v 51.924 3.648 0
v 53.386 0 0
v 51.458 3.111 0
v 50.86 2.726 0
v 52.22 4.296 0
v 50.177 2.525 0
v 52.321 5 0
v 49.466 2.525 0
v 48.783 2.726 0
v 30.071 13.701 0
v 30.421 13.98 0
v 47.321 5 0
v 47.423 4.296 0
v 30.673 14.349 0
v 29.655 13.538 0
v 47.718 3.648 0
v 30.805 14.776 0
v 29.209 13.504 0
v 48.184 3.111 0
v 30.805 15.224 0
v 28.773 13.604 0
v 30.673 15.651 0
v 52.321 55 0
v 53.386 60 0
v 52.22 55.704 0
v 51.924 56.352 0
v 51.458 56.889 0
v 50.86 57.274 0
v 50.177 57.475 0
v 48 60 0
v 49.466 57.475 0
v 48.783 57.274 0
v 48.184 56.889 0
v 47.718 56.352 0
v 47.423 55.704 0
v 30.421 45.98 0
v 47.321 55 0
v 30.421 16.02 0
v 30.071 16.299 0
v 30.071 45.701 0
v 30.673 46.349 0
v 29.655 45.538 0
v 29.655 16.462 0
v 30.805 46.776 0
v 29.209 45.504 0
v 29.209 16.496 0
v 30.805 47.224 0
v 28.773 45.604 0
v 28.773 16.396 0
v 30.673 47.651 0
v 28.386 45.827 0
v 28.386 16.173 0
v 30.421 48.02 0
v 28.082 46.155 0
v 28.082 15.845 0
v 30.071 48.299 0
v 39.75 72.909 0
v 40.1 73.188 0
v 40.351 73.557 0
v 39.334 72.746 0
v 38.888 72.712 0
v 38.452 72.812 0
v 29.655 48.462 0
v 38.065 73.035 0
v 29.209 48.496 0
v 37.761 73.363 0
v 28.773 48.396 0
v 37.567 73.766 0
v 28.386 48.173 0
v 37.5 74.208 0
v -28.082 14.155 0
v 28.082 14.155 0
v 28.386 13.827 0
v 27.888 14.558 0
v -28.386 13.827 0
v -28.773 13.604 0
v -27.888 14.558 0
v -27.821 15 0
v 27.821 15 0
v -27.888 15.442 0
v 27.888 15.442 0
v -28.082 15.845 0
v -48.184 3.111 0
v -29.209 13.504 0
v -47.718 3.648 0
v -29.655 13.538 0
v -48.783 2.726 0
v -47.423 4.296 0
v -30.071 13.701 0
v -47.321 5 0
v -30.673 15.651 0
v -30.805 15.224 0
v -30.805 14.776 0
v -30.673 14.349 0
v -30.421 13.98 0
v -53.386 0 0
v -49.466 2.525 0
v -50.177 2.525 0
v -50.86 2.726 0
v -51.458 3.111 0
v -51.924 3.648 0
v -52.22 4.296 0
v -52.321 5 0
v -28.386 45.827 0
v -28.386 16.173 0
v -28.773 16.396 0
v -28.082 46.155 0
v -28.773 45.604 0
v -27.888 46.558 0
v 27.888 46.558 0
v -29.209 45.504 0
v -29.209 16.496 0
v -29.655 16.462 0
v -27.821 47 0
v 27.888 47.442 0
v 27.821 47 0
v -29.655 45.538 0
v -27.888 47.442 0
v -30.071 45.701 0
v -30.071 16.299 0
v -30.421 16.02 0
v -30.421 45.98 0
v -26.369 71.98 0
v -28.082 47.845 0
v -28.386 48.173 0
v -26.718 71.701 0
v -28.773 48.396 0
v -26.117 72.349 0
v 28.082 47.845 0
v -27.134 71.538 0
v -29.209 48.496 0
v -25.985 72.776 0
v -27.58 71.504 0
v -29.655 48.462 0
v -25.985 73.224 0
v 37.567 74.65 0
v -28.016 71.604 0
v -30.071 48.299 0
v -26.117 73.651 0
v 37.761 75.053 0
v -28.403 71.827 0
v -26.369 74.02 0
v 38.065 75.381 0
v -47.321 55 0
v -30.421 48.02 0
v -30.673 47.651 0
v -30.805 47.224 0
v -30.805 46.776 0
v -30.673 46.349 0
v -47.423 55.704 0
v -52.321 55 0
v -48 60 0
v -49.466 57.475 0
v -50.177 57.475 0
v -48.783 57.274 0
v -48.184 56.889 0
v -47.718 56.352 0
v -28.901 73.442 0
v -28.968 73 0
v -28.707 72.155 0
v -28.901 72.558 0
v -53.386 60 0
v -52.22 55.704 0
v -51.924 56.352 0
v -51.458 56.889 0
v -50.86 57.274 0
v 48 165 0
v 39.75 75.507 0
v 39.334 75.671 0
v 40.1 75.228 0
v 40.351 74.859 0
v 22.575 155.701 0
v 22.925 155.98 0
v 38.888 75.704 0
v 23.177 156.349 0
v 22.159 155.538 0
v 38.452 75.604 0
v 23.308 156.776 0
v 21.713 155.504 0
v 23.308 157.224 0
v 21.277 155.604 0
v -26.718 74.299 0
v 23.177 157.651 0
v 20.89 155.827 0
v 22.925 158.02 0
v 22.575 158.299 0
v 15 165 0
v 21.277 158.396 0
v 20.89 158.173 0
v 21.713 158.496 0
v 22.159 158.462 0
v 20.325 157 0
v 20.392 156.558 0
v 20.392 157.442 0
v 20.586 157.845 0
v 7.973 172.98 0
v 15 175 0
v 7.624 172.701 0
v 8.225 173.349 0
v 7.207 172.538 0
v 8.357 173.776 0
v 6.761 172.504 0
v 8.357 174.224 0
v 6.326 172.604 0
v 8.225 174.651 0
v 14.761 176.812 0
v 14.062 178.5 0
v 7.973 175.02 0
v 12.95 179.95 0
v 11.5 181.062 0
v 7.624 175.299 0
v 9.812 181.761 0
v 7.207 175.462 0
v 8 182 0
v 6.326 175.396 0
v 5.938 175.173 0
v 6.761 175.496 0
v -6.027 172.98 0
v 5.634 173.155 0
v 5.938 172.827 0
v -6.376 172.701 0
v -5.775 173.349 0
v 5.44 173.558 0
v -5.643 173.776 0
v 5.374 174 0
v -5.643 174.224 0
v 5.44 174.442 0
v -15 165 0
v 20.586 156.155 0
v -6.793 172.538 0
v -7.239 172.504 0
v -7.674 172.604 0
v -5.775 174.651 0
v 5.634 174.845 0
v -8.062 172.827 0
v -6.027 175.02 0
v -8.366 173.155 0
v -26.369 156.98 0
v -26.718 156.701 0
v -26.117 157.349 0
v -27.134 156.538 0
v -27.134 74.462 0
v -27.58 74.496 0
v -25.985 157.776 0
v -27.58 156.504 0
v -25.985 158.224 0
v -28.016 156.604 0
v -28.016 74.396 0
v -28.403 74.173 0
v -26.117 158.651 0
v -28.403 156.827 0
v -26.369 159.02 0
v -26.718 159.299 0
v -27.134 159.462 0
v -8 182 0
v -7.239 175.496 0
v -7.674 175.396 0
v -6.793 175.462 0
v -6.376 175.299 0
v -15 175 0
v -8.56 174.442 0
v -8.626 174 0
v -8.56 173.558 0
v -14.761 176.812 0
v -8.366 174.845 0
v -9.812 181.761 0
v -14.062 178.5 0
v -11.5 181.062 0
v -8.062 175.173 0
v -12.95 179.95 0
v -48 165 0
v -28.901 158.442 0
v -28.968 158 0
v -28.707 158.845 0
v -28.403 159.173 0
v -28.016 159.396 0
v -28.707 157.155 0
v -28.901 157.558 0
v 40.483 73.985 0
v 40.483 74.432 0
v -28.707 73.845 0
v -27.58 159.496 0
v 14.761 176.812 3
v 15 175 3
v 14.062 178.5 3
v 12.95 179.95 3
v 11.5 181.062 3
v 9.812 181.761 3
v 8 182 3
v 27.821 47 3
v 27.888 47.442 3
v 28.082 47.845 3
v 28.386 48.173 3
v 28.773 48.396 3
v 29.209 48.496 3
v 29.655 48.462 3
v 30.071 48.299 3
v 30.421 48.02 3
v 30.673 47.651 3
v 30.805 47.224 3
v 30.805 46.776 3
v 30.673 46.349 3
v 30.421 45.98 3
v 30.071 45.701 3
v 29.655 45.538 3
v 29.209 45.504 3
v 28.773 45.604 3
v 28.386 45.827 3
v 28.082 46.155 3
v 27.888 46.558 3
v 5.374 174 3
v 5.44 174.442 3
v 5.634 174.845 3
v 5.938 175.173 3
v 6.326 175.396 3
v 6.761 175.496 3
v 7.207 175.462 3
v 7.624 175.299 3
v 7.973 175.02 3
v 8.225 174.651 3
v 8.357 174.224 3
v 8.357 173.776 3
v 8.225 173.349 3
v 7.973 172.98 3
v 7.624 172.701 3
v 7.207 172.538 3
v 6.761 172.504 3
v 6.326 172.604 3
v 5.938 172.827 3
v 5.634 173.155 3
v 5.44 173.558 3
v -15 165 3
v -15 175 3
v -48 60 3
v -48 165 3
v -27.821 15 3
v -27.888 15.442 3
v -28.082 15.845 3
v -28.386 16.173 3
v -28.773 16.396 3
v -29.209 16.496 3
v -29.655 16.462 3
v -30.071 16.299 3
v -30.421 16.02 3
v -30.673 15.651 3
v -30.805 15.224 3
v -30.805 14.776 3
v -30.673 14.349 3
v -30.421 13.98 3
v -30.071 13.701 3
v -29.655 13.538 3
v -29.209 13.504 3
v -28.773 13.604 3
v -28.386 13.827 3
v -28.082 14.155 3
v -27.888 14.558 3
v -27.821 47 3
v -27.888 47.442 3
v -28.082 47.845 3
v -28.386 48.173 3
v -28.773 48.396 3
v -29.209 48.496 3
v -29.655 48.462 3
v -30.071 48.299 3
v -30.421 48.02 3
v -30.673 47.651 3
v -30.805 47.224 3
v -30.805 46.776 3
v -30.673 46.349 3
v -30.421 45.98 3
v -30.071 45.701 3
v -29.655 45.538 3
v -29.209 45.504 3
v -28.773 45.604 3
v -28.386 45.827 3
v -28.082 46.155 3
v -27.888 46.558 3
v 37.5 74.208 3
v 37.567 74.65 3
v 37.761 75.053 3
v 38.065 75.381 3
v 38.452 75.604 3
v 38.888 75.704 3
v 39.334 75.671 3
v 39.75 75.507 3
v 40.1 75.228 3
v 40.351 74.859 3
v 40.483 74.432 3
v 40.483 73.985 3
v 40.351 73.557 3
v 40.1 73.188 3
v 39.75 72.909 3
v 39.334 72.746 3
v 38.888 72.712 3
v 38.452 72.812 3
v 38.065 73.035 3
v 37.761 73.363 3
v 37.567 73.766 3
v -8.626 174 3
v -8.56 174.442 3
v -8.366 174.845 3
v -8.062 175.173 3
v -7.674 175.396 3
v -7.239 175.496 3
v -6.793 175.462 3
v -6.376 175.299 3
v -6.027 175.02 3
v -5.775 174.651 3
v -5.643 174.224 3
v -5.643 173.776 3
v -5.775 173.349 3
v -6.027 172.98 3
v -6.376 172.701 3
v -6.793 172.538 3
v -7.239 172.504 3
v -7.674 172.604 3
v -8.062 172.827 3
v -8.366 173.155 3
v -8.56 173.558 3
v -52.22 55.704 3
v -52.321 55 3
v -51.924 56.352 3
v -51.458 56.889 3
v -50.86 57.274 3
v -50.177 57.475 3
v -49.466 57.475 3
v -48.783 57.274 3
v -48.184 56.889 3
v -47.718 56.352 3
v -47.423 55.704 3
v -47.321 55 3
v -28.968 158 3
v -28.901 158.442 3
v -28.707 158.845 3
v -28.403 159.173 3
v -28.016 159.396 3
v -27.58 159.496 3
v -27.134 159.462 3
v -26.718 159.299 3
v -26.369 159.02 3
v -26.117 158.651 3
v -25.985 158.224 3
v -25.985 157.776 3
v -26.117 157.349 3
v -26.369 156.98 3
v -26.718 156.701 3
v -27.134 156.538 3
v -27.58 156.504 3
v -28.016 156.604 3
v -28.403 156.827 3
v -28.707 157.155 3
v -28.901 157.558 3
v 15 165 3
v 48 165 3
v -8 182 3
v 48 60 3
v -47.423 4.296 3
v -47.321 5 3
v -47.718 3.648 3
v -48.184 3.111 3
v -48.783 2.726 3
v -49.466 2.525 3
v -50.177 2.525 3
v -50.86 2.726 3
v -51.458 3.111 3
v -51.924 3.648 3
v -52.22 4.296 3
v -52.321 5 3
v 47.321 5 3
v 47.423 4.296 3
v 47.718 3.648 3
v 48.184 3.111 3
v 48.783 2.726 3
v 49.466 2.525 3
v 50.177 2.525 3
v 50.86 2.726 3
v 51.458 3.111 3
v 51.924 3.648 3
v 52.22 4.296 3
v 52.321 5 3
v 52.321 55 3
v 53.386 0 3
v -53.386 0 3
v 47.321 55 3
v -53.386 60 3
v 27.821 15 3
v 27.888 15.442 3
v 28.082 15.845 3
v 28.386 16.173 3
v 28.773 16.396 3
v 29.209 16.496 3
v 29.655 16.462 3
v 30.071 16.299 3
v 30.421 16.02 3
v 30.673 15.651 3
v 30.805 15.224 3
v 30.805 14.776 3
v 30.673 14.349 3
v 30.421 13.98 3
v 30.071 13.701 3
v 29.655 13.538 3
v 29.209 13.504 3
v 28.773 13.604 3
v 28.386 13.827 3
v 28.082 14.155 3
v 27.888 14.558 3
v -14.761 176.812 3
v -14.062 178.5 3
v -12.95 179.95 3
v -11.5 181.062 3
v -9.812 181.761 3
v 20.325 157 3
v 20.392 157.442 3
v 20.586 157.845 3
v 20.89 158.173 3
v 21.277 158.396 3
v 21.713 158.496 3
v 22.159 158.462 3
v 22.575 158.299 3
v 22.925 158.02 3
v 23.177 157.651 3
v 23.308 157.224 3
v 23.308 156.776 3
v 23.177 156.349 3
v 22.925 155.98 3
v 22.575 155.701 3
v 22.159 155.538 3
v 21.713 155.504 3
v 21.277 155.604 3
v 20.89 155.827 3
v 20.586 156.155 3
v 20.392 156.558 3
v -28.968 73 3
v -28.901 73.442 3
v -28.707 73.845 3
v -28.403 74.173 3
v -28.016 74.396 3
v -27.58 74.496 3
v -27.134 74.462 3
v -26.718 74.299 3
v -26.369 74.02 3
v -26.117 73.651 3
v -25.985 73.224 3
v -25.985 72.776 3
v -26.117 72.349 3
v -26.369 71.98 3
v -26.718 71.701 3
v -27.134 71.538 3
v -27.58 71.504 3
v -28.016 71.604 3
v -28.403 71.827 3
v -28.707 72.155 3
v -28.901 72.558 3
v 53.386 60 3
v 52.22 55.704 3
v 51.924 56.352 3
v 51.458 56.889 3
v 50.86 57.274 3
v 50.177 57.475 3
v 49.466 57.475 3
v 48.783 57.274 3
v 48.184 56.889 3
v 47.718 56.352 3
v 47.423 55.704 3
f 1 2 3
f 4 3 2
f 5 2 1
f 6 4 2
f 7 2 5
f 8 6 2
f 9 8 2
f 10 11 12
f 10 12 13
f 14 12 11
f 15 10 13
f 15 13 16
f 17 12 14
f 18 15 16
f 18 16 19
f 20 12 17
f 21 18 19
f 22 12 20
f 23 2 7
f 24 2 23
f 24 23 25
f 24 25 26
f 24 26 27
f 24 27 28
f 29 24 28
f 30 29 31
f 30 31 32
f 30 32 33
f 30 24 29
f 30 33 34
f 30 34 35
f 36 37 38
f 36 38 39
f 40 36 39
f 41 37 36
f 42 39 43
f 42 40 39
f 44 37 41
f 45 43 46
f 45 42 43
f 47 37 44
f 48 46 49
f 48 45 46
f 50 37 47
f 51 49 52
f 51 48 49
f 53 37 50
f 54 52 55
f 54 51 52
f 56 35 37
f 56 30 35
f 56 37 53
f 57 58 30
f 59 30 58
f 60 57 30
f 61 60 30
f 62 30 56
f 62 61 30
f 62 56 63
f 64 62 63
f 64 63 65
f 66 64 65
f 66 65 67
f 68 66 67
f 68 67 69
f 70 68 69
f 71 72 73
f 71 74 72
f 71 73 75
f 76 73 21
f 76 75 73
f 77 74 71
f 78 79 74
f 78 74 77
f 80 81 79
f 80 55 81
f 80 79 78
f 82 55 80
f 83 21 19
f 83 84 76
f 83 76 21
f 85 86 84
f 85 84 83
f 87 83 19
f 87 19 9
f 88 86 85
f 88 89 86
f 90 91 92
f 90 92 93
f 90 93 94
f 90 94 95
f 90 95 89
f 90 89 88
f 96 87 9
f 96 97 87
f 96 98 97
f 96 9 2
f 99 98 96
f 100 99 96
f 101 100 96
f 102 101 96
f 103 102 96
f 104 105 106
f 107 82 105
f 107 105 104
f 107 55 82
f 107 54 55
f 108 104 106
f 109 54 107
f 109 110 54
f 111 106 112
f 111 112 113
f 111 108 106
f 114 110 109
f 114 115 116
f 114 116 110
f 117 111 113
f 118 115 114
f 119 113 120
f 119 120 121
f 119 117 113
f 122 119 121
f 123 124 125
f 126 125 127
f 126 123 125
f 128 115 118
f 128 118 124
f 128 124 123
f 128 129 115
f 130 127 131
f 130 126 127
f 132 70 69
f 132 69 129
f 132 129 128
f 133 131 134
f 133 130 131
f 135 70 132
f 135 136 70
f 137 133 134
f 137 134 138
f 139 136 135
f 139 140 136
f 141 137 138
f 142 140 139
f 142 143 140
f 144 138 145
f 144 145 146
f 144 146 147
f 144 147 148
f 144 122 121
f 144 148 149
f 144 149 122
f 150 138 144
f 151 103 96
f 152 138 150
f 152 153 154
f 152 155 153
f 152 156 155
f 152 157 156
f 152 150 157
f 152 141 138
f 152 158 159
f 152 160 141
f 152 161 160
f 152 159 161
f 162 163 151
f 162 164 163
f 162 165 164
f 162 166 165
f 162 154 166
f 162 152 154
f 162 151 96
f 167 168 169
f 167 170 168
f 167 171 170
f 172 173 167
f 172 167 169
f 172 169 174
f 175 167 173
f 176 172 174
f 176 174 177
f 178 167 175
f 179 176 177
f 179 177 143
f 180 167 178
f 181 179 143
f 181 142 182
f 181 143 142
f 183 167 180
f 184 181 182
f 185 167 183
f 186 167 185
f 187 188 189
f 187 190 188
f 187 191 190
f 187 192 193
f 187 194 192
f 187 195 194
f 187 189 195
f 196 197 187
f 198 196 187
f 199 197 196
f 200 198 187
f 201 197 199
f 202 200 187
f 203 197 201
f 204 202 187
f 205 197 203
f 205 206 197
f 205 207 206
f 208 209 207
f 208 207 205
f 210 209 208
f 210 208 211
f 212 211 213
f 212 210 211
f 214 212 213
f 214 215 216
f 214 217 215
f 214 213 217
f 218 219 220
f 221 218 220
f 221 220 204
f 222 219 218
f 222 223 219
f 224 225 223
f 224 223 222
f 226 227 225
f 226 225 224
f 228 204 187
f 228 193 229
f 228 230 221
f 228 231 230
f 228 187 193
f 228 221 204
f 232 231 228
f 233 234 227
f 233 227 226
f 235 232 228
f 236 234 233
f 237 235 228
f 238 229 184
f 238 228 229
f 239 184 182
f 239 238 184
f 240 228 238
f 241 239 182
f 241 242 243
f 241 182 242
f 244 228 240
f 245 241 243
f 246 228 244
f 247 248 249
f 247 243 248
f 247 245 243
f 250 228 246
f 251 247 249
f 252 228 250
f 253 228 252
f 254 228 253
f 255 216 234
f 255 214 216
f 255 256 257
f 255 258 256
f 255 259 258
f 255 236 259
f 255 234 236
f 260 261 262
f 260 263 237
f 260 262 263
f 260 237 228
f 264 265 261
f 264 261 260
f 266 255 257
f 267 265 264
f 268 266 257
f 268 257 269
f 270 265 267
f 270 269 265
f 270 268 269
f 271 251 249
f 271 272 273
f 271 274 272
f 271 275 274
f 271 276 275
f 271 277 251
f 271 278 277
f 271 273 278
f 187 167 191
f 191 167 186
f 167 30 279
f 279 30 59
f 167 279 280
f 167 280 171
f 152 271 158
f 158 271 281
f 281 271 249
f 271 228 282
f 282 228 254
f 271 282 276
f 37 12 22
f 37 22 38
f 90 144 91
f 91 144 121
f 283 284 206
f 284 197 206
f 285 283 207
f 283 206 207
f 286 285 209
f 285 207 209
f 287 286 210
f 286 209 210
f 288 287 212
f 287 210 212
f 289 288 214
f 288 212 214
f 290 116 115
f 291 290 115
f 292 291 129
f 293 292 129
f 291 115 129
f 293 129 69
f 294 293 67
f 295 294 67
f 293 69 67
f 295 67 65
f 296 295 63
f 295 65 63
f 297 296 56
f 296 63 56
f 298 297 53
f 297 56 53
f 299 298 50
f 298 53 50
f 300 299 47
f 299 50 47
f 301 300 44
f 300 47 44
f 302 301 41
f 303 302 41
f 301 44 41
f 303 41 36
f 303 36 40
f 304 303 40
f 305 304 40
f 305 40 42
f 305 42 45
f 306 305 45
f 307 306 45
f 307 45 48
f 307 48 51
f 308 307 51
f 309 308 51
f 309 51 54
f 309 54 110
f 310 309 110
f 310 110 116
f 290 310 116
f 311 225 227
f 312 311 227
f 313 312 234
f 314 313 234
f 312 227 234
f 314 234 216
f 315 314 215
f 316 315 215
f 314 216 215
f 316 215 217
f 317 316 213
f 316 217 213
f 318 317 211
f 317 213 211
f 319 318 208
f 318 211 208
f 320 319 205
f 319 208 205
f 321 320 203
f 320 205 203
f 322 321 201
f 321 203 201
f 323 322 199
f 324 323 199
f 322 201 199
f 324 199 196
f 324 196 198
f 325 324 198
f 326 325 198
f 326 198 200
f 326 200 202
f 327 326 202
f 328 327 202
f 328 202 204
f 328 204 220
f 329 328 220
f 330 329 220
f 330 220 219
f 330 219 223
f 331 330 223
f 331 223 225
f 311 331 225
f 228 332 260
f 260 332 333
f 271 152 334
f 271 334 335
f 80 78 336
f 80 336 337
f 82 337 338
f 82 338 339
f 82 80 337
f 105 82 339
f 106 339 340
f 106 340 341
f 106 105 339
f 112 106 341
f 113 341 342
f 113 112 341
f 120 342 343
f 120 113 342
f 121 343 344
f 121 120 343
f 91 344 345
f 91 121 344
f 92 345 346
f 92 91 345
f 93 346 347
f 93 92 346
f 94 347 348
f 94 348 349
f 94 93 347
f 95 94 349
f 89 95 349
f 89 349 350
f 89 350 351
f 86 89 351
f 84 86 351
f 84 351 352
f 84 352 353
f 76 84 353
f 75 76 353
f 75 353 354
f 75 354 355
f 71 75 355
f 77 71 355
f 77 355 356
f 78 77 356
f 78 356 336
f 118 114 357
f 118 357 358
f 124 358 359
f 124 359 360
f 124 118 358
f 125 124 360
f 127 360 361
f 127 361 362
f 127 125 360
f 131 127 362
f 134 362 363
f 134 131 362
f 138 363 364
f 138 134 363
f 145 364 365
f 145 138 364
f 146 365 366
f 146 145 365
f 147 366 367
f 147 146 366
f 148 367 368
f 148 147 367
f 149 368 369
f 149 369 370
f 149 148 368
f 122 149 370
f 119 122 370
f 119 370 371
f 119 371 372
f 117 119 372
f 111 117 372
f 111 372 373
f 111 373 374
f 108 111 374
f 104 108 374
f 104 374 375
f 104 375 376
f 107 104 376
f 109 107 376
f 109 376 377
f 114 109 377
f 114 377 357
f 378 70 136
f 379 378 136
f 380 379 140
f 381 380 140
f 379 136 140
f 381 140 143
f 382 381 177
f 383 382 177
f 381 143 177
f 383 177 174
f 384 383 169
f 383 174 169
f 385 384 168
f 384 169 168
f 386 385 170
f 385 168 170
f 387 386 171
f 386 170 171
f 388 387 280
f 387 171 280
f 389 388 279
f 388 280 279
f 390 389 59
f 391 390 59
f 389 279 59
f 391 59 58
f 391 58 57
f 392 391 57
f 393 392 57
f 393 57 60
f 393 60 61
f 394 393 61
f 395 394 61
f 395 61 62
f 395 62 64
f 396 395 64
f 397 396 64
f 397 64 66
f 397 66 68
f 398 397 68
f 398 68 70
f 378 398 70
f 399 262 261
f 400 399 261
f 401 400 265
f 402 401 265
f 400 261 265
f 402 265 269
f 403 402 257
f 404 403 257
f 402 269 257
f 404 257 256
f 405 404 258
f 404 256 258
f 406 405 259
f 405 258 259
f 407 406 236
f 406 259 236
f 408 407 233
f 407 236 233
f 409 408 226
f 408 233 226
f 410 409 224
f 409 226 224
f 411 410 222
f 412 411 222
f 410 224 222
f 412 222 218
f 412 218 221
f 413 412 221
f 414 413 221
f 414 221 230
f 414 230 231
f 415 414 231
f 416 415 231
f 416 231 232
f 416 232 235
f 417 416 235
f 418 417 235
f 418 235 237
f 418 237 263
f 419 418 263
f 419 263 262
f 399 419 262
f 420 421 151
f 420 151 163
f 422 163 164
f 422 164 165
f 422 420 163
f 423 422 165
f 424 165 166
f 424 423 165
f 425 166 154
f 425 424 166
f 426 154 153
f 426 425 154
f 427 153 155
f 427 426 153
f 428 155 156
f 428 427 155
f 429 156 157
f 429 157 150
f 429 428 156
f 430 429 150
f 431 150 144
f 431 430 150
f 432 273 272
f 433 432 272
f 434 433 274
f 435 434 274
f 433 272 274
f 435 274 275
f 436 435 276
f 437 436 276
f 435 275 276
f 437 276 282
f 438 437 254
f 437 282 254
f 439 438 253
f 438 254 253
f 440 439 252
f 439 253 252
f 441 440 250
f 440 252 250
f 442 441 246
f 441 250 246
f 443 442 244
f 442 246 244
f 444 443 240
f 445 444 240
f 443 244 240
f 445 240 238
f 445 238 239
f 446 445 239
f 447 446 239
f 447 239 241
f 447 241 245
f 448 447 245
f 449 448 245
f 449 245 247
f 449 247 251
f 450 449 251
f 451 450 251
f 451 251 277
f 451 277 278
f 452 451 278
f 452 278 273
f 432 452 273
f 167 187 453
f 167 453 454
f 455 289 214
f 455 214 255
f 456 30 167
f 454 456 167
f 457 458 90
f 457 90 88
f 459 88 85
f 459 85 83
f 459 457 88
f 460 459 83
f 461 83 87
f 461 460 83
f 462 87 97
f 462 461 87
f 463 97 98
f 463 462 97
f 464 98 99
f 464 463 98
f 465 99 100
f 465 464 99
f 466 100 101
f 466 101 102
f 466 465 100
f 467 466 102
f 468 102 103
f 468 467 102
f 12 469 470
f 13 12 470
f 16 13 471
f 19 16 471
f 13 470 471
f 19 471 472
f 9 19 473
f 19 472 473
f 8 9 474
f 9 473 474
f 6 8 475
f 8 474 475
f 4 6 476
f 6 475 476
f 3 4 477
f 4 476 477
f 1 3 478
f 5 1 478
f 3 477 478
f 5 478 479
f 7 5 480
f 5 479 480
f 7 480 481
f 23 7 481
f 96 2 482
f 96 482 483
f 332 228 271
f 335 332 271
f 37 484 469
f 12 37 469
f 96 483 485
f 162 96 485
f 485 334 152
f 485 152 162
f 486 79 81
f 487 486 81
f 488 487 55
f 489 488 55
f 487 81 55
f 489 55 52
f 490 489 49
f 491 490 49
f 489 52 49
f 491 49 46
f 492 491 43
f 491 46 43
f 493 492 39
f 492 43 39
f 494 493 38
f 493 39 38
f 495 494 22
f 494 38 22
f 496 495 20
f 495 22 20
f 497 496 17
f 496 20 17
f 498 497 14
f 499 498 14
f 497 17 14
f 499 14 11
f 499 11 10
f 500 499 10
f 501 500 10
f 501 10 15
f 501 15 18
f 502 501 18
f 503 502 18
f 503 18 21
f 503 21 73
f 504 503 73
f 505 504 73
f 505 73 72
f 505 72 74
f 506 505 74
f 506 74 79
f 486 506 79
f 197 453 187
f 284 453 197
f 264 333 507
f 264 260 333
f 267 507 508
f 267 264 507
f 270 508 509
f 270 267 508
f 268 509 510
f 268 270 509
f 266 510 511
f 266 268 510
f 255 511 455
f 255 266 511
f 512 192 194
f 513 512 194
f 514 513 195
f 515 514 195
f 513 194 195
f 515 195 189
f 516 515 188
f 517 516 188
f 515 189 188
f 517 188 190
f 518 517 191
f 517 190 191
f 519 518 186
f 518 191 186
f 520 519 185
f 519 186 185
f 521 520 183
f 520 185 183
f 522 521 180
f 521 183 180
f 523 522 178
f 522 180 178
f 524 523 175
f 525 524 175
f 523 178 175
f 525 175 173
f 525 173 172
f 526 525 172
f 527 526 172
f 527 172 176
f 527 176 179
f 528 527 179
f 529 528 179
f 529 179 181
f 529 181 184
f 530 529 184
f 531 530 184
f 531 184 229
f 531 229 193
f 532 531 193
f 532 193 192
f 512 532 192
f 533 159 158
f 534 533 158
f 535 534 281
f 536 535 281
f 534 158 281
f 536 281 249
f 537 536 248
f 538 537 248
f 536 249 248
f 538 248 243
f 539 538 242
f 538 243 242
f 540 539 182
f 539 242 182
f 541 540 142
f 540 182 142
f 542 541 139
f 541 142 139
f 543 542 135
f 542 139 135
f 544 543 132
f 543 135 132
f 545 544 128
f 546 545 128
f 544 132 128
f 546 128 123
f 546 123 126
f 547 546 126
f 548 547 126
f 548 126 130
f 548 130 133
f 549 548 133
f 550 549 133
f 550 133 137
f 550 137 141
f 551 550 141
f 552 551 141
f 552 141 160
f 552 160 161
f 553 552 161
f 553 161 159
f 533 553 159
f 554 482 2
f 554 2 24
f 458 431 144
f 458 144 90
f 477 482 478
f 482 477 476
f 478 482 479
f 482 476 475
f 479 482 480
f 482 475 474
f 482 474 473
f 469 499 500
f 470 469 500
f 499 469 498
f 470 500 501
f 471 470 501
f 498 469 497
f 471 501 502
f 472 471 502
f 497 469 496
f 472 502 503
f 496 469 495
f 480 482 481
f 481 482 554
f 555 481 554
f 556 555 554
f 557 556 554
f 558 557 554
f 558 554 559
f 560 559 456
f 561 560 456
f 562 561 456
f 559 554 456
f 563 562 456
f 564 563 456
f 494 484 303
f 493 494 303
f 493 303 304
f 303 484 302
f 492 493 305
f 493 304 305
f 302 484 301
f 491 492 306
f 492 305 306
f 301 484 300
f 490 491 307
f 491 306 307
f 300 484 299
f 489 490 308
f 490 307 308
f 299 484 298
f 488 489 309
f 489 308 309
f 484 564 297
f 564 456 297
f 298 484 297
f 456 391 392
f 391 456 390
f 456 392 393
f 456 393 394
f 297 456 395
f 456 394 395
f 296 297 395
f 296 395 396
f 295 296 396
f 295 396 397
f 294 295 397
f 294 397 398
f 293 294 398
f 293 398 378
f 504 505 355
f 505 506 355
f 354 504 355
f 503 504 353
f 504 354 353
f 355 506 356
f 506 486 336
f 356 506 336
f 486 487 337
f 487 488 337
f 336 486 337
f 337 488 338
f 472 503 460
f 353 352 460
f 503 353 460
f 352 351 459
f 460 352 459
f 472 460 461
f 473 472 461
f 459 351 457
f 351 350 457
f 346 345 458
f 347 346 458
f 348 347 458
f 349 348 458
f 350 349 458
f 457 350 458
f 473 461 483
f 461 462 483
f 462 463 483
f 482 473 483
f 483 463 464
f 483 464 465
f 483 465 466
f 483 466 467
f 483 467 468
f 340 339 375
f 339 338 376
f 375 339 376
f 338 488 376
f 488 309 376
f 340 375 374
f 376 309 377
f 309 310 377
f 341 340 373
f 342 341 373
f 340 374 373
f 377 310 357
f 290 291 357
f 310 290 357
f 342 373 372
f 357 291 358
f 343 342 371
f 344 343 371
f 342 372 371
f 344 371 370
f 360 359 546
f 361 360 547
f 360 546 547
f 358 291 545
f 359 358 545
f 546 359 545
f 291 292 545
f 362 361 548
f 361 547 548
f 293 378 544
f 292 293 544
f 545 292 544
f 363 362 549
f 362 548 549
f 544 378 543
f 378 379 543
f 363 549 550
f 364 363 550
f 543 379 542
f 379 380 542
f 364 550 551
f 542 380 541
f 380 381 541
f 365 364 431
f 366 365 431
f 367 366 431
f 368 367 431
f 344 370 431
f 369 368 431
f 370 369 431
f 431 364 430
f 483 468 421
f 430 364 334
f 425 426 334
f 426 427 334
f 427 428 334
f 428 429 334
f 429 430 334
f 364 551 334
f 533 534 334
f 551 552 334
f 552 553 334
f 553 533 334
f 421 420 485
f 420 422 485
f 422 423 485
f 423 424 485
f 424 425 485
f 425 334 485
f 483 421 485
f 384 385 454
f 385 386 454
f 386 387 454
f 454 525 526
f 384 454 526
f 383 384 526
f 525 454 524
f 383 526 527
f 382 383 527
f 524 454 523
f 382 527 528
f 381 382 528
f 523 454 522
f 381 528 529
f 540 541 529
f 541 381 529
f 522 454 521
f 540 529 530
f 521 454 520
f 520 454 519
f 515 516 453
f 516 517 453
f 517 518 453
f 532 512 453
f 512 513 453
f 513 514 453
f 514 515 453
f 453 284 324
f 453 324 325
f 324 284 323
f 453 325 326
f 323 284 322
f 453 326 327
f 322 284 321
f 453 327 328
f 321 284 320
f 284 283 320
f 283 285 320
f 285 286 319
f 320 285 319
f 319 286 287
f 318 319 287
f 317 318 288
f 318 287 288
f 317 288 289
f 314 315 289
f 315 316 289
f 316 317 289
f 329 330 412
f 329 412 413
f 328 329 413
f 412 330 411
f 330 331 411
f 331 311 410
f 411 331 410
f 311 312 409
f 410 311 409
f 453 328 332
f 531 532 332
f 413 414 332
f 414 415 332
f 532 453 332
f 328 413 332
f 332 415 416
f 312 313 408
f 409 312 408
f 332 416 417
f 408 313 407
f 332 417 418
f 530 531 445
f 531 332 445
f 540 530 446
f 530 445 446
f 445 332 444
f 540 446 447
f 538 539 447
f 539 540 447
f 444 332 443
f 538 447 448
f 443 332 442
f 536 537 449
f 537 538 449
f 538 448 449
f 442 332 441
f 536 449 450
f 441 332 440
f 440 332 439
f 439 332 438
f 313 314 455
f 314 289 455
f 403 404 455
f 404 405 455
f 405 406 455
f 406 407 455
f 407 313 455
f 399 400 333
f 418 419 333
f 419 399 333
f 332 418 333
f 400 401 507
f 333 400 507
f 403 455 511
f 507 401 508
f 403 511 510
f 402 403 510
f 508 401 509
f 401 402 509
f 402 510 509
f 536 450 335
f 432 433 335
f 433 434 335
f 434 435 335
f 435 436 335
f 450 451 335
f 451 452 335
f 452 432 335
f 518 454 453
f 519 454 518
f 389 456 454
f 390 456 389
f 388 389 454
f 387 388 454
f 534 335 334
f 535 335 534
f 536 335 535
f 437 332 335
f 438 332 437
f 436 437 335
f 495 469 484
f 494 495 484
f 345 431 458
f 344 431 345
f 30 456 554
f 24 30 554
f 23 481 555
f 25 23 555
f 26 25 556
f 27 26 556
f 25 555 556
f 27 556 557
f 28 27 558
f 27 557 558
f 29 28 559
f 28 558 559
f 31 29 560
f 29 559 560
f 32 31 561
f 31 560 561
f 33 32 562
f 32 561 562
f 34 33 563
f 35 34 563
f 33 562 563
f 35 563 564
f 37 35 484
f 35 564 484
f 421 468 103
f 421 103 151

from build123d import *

# Parameters (mm, degrees)
F0_W      = 48
F0_H      = 165
F1_DEPTH  = 3
F2_W      = 5.386259
F2_H      = 60
F1_FACE_W = 48
F1_FACE_H = 165
F3_DEPTH  = 3
F4_W      = 15
F4_H      = 17
F5_DEPTH  = 3
F6_R      = 7
F8_DEPTH  = 61.790481
F10_D     = 3
F15_D     = 3
F17_D     = 3
F19_D     = 3
F21_D     = 3


with BuildPart() as f1:
    # F0 (on Top) → F1 (new body)
    with BuildSketch(Plane.XY):
        with Locations((24, 82.5)):
            Rectangle(F0_W, F0_H)
    extrude(amount=F1_DEPTH)

    # F2 (on face) + F1_face (on face) → F3 (join)
    with BuildSketch(Plane.XY.offset(3)):
        with Locations((50.693129, 30)):
            Rectangle(F2_W, F2_H)
    with BuildSketch(Plane(origin=(24, 82.5, 3), x_dir=(1, 0, 0), z_dir=(0, 0, 1))):
        Rectangle(F1_FACE_W, F1_FACE_H)
    extrude(amount=-F3_DEPTH)

    # F4 (on face) → F5 (join)
    with BuildSketch(Plane.XY.offset(3)):
        with Locations((7.5, 173.5)):
            Rectangle(F4_W, F4_H)
    extrude(amount=-F5_DEPTH)

    # F6
    f6_edges = [f1.edges().sort_by_distance(p)[0] for p in [
        (15, 182, 1.5),
    ]]
    fillet(f6_edges, radius=F6_R)

    # F7 (on face) → F8 (cut)
    with BuildSketch(Plane.XY.offset(3)):
        with BuildLine():
            ThreePointArc((52.321299, 55), (49.821299, 57.5), (47.321299, 55))
            Line((47.321299, 55), (47.321299, 5))
            ThreePointArc((47.321299, 5), (49.821299, 2.5), (52.321299, 5))
            Line((52.321299, 5), (52.321299, 55))
        make_face()
    extrude(amount=-F8_DEPTH, mode=Mode.SUBTRACT)

    # F10 (through all)
    with Locations(Plane.XY.offset(3)):
        with Locations((29.321299, 15), (29.321299, 47)):
            Hole(F10_D / 2)

    # F13: F1 across plane


with BuildPart() as f1_1:
    add(f1.part)
    add(f1.part.mirror(Plane.YZ))

    # F15 (through all)
    with Locations(Plane.XY.offset(3)):
        with Locations((6.873526, 174), (-7.126474, 174)):
            Hole(F15_D / 2)

    # F17 (through all)
    with Locations(Plane.XY.offset(3)):
        with Locations((21.825111, 157)):
            Hole(F17_D / 2)

    # F19 (through all)
    with Locations(Plane.XY.offset(3)):
        with Locations((-27.468093, 73), (-27.468093, 158)):
            Hole(F19_D / 2)

    # F21 (through all)
    with Locations(Plane.XY.offset(3)):
        with Locations((39, 74.208118)):
            Hole(F21_D / 2)


solid = f1_1.part
